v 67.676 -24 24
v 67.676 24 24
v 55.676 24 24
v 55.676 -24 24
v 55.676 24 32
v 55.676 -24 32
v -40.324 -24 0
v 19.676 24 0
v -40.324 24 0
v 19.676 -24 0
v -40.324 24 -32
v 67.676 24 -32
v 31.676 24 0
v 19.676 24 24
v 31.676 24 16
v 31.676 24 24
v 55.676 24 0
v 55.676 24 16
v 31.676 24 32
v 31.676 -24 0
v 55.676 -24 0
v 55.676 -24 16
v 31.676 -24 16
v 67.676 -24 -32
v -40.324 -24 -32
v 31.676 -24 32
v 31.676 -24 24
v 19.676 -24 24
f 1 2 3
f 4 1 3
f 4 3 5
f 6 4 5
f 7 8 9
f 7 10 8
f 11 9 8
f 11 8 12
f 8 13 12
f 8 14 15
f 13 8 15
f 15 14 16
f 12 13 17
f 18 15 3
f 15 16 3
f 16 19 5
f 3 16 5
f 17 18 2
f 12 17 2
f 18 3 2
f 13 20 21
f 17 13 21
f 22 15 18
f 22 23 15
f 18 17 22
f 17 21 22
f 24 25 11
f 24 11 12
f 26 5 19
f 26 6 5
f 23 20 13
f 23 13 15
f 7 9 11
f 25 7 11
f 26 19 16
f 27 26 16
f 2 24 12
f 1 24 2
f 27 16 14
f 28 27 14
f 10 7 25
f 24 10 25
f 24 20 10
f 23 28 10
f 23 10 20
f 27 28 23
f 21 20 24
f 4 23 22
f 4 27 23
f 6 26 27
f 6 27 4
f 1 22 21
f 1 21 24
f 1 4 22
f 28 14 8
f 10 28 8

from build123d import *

# Parameters (mm, degrees)
F0_W     = 24
F0_H     = 16
F1_DEPTH = 24


with BuildPart() as f1:
    # F0 (on Front) → F1 (new body, symmetric)
    with BuildSketch(Plane.XZ):
        Polygon((19.676238, 0), (-40.323762, 0), (-40.323762, -32), (67.676238, -32), (67.676238, 16), (67.676238, 24), (55.676238, 24), (55.676238, 32), (31.676238, 32), (31.676238, 24), (19.676238, 24), align=None)
        with Locations((43.676238, 8)):
            Rectangle(F0_W, F0_H, mode=Mode.SUBTRACT)
    extrude(amount=F1_DEPTH, both=True)


solid = f1.part
